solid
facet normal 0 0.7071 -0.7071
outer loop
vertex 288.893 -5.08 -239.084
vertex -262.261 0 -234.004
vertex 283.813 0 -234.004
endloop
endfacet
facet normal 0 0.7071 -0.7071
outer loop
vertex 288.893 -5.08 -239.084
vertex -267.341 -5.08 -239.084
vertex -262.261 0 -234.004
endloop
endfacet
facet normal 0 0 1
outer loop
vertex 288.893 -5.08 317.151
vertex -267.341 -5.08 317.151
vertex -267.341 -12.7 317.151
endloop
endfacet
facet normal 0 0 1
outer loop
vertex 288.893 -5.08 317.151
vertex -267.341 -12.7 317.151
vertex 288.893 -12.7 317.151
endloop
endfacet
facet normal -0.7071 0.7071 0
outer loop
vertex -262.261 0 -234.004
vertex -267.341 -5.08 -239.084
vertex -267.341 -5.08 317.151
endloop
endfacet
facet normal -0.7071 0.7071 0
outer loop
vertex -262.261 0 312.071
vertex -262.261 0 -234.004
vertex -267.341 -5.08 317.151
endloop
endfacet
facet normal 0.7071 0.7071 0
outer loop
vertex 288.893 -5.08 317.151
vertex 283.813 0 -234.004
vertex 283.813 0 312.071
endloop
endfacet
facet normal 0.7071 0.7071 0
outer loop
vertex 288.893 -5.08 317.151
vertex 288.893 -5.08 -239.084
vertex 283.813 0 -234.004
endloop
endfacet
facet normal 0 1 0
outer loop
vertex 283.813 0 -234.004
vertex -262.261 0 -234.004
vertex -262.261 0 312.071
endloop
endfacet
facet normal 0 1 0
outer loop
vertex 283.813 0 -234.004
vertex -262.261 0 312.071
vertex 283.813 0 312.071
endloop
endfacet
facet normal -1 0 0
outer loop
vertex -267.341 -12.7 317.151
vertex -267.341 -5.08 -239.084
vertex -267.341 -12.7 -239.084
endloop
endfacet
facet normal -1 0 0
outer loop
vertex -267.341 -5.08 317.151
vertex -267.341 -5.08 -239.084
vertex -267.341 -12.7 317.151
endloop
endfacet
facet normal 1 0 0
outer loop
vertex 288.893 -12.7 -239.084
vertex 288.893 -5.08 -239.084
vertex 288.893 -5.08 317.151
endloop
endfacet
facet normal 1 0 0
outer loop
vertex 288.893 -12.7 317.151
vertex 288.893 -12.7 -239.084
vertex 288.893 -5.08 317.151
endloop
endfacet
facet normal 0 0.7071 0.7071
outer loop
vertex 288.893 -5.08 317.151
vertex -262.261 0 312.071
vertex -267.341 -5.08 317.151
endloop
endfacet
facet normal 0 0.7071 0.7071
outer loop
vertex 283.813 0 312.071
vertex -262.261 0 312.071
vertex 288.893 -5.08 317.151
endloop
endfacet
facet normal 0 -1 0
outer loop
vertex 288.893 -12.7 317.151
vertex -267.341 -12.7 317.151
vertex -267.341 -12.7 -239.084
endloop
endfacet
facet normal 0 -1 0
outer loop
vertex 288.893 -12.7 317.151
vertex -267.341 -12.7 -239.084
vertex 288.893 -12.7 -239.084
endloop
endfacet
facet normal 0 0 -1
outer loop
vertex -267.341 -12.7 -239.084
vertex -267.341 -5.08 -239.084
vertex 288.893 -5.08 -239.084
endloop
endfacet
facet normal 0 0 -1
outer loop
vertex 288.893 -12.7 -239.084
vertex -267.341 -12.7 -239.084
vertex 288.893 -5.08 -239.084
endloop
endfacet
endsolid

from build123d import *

# Parameters (mm, degrees)
F0_W     = 556.2346
F0_H     = 556.2346
F1_DEPTH = 12.7
F2_SIZE  = 5.08
F3_SIZE  = 5.08
F4_SIZE  = 5.08
F5_SIZE  = 5.08


with BuildPart() as f1:
    # F0 (on Front) → F1 (new body)
    with BuildSketch(Plane.XZ):
        with Locations((10.775876, 39.033592)):
            Rectangle(F0_W, F0_H)
    extrude(amount=F1_DEPTH)

    # F2
    f2_edges = [f1.edges().sort_by_distance(p)[0] for p in [
        (10.775876, 0, 317.150892),
    ]]
    chamfer(f2_edges, length=F2_SIZE)

    # F3
    f3_edges = [f1.edges().sort_by_distance(p)[0] for p in [
        (288.893176, 0, 36.493592),
    ]]
    chamfer(f3_edges, length=F3_SIZE)

    # F4
    f4_edges = [f1.edges().sort_by_distance(p)[0] for p in [
        (8.235876, 0, -239.083708),
    ]]
    chamfer(f4_edges, length=F4_SIZE)

    # F5
    f5_edges = [f1.edges().sort_by_distance(p)[0] for p in [
        (-267.341424, 0, 39.033592),
    ]]
    chamfer(f5_edges, length=F5_SIZE)


solid = f1.part
